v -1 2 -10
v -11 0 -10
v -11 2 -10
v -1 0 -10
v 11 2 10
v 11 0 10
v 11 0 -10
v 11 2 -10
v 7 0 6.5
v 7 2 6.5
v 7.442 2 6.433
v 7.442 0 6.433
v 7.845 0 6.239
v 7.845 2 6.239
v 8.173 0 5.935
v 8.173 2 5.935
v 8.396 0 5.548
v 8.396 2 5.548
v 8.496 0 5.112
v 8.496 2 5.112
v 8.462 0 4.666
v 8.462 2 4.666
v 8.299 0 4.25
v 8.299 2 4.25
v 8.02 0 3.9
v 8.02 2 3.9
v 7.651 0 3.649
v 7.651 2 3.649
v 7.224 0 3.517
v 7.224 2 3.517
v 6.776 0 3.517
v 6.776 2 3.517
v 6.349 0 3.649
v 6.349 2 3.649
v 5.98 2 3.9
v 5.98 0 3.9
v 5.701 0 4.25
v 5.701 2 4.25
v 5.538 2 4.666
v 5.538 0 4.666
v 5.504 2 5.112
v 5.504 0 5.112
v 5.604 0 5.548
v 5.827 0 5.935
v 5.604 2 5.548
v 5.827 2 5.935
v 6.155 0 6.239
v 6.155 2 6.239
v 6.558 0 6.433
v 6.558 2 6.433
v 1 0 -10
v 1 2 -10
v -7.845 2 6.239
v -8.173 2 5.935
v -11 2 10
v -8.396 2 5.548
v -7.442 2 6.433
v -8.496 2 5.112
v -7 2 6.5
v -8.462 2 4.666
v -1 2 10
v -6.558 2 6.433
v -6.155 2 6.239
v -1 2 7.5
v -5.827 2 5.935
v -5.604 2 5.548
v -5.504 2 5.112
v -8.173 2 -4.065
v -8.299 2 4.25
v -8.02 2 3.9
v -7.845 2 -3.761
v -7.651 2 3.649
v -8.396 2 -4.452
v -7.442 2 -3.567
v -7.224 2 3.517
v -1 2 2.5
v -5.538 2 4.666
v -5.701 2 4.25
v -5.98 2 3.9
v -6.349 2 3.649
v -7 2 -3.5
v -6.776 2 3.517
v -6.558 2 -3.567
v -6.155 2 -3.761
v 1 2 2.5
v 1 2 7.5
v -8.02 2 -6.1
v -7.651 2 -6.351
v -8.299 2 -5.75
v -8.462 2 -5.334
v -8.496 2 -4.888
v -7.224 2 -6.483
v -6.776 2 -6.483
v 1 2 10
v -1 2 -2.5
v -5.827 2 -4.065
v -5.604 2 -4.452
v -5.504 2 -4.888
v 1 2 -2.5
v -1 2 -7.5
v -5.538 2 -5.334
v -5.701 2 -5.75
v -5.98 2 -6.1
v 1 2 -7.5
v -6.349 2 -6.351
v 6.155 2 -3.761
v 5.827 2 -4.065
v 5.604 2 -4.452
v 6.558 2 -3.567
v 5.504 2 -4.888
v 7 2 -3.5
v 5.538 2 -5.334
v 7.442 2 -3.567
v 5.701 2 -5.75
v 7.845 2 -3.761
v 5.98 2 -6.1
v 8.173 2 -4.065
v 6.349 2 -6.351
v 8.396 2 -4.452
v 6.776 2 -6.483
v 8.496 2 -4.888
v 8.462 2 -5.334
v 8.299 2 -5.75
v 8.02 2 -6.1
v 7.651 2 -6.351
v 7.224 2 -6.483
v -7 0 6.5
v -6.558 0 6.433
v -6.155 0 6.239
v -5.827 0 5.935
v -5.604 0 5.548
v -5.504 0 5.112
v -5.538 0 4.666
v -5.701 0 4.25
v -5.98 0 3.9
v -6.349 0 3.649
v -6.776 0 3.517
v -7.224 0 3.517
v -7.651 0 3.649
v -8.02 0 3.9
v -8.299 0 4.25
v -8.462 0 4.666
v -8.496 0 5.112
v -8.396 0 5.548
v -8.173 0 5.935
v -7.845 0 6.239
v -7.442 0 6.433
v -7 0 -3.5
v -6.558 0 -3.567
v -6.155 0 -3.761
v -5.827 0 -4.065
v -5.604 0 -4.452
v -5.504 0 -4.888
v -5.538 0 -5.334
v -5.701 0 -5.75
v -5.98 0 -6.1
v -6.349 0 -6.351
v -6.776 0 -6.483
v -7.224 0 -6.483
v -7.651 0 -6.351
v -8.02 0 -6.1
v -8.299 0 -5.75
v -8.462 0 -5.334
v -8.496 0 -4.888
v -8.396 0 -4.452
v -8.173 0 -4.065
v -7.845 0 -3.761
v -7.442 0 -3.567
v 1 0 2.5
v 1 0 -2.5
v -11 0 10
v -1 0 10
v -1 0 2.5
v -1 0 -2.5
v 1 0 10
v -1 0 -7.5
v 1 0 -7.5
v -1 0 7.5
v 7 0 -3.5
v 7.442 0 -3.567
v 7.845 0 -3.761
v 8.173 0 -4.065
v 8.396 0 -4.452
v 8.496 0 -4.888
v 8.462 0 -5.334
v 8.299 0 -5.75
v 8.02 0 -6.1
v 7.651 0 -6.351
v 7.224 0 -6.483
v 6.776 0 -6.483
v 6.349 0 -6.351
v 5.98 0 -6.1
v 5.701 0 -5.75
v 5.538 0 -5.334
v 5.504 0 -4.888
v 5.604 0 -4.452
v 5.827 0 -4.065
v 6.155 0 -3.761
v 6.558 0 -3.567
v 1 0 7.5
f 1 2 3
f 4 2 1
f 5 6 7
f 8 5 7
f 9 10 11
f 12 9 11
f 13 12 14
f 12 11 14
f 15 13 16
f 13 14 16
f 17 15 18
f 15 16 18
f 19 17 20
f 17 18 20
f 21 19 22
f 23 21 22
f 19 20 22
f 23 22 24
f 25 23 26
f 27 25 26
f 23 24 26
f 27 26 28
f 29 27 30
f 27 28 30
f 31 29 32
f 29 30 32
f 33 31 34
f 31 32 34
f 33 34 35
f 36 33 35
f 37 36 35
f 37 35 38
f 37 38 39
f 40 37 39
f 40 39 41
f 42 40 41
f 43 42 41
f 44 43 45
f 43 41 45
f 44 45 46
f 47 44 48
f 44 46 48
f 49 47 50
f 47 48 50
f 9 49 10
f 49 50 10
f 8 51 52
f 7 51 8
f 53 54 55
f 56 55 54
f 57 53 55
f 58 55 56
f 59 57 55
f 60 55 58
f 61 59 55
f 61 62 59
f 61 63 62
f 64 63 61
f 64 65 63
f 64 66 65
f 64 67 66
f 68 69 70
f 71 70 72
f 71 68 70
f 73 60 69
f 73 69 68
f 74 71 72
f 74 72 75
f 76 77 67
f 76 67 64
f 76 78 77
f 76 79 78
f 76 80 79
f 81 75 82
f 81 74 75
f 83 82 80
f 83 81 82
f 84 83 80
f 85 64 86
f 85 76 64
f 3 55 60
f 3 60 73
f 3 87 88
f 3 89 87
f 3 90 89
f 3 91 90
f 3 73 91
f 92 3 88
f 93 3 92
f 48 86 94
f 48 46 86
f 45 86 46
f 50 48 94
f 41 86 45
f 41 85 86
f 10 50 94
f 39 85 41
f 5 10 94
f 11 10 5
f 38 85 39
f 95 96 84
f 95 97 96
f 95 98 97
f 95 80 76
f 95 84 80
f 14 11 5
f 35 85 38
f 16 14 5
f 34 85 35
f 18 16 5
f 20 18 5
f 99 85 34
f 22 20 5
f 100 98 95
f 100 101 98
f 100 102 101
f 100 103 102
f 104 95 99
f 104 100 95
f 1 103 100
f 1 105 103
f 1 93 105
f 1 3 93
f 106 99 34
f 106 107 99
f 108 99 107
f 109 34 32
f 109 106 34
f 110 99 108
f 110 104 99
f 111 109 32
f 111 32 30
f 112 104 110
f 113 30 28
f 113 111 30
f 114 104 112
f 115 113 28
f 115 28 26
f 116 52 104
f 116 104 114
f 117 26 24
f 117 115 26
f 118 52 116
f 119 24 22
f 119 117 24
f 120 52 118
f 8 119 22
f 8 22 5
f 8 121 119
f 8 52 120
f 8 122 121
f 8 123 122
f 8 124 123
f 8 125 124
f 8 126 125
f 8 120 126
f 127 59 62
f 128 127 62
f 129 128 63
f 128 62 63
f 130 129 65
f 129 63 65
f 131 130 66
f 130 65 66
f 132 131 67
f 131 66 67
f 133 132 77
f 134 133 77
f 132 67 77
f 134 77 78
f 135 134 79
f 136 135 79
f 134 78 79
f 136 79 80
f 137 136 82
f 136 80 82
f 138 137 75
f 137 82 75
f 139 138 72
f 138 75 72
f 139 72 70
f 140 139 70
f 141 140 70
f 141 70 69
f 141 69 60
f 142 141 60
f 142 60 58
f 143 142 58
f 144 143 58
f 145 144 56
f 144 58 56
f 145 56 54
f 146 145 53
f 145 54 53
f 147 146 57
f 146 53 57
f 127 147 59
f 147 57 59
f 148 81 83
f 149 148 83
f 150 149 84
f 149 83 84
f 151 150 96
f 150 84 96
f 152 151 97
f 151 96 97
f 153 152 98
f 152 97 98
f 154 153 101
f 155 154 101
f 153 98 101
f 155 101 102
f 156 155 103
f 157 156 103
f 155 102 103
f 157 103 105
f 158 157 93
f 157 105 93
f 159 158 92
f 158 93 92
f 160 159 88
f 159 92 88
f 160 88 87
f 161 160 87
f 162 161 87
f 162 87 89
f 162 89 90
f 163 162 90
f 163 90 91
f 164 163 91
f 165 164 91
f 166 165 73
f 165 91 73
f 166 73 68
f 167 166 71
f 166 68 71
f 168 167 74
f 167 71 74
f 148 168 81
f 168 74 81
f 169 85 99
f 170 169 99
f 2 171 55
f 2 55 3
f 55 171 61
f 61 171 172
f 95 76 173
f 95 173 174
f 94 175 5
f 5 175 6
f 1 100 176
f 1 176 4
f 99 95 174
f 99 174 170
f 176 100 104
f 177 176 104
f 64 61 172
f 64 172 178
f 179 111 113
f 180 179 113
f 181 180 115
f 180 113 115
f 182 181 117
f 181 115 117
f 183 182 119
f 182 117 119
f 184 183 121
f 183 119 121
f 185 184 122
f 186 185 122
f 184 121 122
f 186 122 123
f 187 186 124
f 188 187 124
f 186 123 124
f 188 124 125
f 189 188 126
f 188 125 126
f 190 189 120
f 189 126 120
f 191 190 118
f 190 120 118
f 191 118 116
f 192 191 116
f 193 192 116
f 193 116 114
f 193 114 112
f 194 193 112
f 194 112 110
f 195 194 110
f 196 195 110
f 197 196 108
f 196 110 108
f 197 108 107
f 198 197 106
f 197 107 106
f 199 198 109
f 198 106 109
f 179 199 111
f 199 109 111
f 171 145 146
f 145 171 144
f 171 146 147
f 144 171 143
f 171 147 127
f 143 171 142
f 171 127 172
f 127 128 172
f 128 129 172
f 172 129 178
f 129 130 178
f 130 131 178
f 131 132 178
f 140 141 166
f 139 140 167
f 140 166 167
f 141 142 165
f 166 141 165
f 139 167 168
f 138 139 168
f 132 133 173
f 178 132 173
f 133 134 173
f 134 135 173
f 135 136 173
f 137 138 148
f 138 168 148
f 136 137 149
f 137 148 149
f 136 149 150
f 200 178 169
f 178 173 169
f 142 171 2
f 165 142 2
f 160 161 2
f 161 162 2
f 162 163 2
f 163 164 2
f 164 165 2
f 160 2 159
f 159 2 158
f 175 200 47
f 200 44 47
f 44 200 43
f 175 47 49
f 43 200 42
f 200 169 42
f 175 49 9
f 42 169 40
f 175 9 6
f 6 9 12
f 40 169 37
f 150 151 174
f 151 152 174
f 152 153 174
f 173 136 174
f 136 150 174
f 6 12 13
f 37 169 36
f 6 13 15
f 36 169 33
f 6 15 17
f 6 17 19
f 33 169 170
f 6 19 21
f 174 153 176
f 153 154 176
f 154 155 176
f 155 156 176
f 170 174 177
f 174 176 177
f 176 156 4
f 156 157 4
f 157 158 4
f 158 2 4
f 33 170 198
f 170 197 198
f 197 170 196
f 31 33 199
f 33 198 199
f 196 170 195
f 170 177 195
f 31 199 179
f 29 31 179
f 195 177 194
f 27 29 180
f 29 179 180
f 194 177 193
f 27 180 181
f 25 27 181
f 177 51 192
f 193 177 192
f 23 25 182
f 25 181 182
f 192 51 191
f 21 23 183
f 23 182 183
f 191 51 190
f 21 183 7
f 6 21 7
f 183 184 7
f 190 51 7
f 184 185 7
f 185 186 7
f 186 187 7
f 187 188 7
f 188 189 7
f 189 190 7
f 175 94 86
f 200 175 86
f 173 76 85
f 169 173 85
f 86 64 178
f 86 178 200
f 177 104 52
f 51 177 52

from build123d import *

# Parameters (mm, degrees)
SKETCH1_W           = 22
SKETCH1_H           = 20
BOSS_EXTRUDE1_DEPTH = 2
SKETCH2_R           = 1.5
SKETCH2_W           = 2
SKETCH2_H           = 2.5
SKETCH2_H_2         = 5
CUT_EXTRUDE1_DEPTH  = 2


with BuildPart() as part:
    # Sketch1 → Boss-Extrude1 (new body)
    with BuildSketch(Plane(origin=(0, 0, 0), x_dir=(1, 0, 0), z_dir=(0, 1, 0))):
        Rectangle(SKETCH1_W, SKETCH1_H)
    extrude(amount=BOSS_EXTRUDE1_DEPTH)

    # Sketch2 → Cut-Extrude1 (cut)
    with BuildSketch(Plane(origin=(0, 2, 0), x_dir=(1, 0, 0), z_dir=(0, 1, 0))):
        with Locations(Location((-7, 5, 0), (0, 0, 270))):
            Circle(SKETCH2_R)
        with Locations(Location((-7, -5, 0), (0, 0, 270))):
            Circle(SKETCH2_R)
        with Locations(Location((7, 5, 0), (0, 0, 270))):
            Circle(SKETCH2_R)
        with Locations(Location((7, -5, 0), (0, 0, 270))):
            Circle(SKETCH2_R)
        with Locations((0, 8.75)):
            Rectangle(SKETCH2_W, SKETCH2_H)
        Rectangle(SKETCH2_W, SKETCH2_H_2)
        with Locations((0, -8.75)):
            Rectangle(SKETCH2_W, SKETCH2_H)
    extrude(amount=-CUT_EXTRUDE1_DEPTH, mode=Mode.SUBTRACT)


solid = part.part
